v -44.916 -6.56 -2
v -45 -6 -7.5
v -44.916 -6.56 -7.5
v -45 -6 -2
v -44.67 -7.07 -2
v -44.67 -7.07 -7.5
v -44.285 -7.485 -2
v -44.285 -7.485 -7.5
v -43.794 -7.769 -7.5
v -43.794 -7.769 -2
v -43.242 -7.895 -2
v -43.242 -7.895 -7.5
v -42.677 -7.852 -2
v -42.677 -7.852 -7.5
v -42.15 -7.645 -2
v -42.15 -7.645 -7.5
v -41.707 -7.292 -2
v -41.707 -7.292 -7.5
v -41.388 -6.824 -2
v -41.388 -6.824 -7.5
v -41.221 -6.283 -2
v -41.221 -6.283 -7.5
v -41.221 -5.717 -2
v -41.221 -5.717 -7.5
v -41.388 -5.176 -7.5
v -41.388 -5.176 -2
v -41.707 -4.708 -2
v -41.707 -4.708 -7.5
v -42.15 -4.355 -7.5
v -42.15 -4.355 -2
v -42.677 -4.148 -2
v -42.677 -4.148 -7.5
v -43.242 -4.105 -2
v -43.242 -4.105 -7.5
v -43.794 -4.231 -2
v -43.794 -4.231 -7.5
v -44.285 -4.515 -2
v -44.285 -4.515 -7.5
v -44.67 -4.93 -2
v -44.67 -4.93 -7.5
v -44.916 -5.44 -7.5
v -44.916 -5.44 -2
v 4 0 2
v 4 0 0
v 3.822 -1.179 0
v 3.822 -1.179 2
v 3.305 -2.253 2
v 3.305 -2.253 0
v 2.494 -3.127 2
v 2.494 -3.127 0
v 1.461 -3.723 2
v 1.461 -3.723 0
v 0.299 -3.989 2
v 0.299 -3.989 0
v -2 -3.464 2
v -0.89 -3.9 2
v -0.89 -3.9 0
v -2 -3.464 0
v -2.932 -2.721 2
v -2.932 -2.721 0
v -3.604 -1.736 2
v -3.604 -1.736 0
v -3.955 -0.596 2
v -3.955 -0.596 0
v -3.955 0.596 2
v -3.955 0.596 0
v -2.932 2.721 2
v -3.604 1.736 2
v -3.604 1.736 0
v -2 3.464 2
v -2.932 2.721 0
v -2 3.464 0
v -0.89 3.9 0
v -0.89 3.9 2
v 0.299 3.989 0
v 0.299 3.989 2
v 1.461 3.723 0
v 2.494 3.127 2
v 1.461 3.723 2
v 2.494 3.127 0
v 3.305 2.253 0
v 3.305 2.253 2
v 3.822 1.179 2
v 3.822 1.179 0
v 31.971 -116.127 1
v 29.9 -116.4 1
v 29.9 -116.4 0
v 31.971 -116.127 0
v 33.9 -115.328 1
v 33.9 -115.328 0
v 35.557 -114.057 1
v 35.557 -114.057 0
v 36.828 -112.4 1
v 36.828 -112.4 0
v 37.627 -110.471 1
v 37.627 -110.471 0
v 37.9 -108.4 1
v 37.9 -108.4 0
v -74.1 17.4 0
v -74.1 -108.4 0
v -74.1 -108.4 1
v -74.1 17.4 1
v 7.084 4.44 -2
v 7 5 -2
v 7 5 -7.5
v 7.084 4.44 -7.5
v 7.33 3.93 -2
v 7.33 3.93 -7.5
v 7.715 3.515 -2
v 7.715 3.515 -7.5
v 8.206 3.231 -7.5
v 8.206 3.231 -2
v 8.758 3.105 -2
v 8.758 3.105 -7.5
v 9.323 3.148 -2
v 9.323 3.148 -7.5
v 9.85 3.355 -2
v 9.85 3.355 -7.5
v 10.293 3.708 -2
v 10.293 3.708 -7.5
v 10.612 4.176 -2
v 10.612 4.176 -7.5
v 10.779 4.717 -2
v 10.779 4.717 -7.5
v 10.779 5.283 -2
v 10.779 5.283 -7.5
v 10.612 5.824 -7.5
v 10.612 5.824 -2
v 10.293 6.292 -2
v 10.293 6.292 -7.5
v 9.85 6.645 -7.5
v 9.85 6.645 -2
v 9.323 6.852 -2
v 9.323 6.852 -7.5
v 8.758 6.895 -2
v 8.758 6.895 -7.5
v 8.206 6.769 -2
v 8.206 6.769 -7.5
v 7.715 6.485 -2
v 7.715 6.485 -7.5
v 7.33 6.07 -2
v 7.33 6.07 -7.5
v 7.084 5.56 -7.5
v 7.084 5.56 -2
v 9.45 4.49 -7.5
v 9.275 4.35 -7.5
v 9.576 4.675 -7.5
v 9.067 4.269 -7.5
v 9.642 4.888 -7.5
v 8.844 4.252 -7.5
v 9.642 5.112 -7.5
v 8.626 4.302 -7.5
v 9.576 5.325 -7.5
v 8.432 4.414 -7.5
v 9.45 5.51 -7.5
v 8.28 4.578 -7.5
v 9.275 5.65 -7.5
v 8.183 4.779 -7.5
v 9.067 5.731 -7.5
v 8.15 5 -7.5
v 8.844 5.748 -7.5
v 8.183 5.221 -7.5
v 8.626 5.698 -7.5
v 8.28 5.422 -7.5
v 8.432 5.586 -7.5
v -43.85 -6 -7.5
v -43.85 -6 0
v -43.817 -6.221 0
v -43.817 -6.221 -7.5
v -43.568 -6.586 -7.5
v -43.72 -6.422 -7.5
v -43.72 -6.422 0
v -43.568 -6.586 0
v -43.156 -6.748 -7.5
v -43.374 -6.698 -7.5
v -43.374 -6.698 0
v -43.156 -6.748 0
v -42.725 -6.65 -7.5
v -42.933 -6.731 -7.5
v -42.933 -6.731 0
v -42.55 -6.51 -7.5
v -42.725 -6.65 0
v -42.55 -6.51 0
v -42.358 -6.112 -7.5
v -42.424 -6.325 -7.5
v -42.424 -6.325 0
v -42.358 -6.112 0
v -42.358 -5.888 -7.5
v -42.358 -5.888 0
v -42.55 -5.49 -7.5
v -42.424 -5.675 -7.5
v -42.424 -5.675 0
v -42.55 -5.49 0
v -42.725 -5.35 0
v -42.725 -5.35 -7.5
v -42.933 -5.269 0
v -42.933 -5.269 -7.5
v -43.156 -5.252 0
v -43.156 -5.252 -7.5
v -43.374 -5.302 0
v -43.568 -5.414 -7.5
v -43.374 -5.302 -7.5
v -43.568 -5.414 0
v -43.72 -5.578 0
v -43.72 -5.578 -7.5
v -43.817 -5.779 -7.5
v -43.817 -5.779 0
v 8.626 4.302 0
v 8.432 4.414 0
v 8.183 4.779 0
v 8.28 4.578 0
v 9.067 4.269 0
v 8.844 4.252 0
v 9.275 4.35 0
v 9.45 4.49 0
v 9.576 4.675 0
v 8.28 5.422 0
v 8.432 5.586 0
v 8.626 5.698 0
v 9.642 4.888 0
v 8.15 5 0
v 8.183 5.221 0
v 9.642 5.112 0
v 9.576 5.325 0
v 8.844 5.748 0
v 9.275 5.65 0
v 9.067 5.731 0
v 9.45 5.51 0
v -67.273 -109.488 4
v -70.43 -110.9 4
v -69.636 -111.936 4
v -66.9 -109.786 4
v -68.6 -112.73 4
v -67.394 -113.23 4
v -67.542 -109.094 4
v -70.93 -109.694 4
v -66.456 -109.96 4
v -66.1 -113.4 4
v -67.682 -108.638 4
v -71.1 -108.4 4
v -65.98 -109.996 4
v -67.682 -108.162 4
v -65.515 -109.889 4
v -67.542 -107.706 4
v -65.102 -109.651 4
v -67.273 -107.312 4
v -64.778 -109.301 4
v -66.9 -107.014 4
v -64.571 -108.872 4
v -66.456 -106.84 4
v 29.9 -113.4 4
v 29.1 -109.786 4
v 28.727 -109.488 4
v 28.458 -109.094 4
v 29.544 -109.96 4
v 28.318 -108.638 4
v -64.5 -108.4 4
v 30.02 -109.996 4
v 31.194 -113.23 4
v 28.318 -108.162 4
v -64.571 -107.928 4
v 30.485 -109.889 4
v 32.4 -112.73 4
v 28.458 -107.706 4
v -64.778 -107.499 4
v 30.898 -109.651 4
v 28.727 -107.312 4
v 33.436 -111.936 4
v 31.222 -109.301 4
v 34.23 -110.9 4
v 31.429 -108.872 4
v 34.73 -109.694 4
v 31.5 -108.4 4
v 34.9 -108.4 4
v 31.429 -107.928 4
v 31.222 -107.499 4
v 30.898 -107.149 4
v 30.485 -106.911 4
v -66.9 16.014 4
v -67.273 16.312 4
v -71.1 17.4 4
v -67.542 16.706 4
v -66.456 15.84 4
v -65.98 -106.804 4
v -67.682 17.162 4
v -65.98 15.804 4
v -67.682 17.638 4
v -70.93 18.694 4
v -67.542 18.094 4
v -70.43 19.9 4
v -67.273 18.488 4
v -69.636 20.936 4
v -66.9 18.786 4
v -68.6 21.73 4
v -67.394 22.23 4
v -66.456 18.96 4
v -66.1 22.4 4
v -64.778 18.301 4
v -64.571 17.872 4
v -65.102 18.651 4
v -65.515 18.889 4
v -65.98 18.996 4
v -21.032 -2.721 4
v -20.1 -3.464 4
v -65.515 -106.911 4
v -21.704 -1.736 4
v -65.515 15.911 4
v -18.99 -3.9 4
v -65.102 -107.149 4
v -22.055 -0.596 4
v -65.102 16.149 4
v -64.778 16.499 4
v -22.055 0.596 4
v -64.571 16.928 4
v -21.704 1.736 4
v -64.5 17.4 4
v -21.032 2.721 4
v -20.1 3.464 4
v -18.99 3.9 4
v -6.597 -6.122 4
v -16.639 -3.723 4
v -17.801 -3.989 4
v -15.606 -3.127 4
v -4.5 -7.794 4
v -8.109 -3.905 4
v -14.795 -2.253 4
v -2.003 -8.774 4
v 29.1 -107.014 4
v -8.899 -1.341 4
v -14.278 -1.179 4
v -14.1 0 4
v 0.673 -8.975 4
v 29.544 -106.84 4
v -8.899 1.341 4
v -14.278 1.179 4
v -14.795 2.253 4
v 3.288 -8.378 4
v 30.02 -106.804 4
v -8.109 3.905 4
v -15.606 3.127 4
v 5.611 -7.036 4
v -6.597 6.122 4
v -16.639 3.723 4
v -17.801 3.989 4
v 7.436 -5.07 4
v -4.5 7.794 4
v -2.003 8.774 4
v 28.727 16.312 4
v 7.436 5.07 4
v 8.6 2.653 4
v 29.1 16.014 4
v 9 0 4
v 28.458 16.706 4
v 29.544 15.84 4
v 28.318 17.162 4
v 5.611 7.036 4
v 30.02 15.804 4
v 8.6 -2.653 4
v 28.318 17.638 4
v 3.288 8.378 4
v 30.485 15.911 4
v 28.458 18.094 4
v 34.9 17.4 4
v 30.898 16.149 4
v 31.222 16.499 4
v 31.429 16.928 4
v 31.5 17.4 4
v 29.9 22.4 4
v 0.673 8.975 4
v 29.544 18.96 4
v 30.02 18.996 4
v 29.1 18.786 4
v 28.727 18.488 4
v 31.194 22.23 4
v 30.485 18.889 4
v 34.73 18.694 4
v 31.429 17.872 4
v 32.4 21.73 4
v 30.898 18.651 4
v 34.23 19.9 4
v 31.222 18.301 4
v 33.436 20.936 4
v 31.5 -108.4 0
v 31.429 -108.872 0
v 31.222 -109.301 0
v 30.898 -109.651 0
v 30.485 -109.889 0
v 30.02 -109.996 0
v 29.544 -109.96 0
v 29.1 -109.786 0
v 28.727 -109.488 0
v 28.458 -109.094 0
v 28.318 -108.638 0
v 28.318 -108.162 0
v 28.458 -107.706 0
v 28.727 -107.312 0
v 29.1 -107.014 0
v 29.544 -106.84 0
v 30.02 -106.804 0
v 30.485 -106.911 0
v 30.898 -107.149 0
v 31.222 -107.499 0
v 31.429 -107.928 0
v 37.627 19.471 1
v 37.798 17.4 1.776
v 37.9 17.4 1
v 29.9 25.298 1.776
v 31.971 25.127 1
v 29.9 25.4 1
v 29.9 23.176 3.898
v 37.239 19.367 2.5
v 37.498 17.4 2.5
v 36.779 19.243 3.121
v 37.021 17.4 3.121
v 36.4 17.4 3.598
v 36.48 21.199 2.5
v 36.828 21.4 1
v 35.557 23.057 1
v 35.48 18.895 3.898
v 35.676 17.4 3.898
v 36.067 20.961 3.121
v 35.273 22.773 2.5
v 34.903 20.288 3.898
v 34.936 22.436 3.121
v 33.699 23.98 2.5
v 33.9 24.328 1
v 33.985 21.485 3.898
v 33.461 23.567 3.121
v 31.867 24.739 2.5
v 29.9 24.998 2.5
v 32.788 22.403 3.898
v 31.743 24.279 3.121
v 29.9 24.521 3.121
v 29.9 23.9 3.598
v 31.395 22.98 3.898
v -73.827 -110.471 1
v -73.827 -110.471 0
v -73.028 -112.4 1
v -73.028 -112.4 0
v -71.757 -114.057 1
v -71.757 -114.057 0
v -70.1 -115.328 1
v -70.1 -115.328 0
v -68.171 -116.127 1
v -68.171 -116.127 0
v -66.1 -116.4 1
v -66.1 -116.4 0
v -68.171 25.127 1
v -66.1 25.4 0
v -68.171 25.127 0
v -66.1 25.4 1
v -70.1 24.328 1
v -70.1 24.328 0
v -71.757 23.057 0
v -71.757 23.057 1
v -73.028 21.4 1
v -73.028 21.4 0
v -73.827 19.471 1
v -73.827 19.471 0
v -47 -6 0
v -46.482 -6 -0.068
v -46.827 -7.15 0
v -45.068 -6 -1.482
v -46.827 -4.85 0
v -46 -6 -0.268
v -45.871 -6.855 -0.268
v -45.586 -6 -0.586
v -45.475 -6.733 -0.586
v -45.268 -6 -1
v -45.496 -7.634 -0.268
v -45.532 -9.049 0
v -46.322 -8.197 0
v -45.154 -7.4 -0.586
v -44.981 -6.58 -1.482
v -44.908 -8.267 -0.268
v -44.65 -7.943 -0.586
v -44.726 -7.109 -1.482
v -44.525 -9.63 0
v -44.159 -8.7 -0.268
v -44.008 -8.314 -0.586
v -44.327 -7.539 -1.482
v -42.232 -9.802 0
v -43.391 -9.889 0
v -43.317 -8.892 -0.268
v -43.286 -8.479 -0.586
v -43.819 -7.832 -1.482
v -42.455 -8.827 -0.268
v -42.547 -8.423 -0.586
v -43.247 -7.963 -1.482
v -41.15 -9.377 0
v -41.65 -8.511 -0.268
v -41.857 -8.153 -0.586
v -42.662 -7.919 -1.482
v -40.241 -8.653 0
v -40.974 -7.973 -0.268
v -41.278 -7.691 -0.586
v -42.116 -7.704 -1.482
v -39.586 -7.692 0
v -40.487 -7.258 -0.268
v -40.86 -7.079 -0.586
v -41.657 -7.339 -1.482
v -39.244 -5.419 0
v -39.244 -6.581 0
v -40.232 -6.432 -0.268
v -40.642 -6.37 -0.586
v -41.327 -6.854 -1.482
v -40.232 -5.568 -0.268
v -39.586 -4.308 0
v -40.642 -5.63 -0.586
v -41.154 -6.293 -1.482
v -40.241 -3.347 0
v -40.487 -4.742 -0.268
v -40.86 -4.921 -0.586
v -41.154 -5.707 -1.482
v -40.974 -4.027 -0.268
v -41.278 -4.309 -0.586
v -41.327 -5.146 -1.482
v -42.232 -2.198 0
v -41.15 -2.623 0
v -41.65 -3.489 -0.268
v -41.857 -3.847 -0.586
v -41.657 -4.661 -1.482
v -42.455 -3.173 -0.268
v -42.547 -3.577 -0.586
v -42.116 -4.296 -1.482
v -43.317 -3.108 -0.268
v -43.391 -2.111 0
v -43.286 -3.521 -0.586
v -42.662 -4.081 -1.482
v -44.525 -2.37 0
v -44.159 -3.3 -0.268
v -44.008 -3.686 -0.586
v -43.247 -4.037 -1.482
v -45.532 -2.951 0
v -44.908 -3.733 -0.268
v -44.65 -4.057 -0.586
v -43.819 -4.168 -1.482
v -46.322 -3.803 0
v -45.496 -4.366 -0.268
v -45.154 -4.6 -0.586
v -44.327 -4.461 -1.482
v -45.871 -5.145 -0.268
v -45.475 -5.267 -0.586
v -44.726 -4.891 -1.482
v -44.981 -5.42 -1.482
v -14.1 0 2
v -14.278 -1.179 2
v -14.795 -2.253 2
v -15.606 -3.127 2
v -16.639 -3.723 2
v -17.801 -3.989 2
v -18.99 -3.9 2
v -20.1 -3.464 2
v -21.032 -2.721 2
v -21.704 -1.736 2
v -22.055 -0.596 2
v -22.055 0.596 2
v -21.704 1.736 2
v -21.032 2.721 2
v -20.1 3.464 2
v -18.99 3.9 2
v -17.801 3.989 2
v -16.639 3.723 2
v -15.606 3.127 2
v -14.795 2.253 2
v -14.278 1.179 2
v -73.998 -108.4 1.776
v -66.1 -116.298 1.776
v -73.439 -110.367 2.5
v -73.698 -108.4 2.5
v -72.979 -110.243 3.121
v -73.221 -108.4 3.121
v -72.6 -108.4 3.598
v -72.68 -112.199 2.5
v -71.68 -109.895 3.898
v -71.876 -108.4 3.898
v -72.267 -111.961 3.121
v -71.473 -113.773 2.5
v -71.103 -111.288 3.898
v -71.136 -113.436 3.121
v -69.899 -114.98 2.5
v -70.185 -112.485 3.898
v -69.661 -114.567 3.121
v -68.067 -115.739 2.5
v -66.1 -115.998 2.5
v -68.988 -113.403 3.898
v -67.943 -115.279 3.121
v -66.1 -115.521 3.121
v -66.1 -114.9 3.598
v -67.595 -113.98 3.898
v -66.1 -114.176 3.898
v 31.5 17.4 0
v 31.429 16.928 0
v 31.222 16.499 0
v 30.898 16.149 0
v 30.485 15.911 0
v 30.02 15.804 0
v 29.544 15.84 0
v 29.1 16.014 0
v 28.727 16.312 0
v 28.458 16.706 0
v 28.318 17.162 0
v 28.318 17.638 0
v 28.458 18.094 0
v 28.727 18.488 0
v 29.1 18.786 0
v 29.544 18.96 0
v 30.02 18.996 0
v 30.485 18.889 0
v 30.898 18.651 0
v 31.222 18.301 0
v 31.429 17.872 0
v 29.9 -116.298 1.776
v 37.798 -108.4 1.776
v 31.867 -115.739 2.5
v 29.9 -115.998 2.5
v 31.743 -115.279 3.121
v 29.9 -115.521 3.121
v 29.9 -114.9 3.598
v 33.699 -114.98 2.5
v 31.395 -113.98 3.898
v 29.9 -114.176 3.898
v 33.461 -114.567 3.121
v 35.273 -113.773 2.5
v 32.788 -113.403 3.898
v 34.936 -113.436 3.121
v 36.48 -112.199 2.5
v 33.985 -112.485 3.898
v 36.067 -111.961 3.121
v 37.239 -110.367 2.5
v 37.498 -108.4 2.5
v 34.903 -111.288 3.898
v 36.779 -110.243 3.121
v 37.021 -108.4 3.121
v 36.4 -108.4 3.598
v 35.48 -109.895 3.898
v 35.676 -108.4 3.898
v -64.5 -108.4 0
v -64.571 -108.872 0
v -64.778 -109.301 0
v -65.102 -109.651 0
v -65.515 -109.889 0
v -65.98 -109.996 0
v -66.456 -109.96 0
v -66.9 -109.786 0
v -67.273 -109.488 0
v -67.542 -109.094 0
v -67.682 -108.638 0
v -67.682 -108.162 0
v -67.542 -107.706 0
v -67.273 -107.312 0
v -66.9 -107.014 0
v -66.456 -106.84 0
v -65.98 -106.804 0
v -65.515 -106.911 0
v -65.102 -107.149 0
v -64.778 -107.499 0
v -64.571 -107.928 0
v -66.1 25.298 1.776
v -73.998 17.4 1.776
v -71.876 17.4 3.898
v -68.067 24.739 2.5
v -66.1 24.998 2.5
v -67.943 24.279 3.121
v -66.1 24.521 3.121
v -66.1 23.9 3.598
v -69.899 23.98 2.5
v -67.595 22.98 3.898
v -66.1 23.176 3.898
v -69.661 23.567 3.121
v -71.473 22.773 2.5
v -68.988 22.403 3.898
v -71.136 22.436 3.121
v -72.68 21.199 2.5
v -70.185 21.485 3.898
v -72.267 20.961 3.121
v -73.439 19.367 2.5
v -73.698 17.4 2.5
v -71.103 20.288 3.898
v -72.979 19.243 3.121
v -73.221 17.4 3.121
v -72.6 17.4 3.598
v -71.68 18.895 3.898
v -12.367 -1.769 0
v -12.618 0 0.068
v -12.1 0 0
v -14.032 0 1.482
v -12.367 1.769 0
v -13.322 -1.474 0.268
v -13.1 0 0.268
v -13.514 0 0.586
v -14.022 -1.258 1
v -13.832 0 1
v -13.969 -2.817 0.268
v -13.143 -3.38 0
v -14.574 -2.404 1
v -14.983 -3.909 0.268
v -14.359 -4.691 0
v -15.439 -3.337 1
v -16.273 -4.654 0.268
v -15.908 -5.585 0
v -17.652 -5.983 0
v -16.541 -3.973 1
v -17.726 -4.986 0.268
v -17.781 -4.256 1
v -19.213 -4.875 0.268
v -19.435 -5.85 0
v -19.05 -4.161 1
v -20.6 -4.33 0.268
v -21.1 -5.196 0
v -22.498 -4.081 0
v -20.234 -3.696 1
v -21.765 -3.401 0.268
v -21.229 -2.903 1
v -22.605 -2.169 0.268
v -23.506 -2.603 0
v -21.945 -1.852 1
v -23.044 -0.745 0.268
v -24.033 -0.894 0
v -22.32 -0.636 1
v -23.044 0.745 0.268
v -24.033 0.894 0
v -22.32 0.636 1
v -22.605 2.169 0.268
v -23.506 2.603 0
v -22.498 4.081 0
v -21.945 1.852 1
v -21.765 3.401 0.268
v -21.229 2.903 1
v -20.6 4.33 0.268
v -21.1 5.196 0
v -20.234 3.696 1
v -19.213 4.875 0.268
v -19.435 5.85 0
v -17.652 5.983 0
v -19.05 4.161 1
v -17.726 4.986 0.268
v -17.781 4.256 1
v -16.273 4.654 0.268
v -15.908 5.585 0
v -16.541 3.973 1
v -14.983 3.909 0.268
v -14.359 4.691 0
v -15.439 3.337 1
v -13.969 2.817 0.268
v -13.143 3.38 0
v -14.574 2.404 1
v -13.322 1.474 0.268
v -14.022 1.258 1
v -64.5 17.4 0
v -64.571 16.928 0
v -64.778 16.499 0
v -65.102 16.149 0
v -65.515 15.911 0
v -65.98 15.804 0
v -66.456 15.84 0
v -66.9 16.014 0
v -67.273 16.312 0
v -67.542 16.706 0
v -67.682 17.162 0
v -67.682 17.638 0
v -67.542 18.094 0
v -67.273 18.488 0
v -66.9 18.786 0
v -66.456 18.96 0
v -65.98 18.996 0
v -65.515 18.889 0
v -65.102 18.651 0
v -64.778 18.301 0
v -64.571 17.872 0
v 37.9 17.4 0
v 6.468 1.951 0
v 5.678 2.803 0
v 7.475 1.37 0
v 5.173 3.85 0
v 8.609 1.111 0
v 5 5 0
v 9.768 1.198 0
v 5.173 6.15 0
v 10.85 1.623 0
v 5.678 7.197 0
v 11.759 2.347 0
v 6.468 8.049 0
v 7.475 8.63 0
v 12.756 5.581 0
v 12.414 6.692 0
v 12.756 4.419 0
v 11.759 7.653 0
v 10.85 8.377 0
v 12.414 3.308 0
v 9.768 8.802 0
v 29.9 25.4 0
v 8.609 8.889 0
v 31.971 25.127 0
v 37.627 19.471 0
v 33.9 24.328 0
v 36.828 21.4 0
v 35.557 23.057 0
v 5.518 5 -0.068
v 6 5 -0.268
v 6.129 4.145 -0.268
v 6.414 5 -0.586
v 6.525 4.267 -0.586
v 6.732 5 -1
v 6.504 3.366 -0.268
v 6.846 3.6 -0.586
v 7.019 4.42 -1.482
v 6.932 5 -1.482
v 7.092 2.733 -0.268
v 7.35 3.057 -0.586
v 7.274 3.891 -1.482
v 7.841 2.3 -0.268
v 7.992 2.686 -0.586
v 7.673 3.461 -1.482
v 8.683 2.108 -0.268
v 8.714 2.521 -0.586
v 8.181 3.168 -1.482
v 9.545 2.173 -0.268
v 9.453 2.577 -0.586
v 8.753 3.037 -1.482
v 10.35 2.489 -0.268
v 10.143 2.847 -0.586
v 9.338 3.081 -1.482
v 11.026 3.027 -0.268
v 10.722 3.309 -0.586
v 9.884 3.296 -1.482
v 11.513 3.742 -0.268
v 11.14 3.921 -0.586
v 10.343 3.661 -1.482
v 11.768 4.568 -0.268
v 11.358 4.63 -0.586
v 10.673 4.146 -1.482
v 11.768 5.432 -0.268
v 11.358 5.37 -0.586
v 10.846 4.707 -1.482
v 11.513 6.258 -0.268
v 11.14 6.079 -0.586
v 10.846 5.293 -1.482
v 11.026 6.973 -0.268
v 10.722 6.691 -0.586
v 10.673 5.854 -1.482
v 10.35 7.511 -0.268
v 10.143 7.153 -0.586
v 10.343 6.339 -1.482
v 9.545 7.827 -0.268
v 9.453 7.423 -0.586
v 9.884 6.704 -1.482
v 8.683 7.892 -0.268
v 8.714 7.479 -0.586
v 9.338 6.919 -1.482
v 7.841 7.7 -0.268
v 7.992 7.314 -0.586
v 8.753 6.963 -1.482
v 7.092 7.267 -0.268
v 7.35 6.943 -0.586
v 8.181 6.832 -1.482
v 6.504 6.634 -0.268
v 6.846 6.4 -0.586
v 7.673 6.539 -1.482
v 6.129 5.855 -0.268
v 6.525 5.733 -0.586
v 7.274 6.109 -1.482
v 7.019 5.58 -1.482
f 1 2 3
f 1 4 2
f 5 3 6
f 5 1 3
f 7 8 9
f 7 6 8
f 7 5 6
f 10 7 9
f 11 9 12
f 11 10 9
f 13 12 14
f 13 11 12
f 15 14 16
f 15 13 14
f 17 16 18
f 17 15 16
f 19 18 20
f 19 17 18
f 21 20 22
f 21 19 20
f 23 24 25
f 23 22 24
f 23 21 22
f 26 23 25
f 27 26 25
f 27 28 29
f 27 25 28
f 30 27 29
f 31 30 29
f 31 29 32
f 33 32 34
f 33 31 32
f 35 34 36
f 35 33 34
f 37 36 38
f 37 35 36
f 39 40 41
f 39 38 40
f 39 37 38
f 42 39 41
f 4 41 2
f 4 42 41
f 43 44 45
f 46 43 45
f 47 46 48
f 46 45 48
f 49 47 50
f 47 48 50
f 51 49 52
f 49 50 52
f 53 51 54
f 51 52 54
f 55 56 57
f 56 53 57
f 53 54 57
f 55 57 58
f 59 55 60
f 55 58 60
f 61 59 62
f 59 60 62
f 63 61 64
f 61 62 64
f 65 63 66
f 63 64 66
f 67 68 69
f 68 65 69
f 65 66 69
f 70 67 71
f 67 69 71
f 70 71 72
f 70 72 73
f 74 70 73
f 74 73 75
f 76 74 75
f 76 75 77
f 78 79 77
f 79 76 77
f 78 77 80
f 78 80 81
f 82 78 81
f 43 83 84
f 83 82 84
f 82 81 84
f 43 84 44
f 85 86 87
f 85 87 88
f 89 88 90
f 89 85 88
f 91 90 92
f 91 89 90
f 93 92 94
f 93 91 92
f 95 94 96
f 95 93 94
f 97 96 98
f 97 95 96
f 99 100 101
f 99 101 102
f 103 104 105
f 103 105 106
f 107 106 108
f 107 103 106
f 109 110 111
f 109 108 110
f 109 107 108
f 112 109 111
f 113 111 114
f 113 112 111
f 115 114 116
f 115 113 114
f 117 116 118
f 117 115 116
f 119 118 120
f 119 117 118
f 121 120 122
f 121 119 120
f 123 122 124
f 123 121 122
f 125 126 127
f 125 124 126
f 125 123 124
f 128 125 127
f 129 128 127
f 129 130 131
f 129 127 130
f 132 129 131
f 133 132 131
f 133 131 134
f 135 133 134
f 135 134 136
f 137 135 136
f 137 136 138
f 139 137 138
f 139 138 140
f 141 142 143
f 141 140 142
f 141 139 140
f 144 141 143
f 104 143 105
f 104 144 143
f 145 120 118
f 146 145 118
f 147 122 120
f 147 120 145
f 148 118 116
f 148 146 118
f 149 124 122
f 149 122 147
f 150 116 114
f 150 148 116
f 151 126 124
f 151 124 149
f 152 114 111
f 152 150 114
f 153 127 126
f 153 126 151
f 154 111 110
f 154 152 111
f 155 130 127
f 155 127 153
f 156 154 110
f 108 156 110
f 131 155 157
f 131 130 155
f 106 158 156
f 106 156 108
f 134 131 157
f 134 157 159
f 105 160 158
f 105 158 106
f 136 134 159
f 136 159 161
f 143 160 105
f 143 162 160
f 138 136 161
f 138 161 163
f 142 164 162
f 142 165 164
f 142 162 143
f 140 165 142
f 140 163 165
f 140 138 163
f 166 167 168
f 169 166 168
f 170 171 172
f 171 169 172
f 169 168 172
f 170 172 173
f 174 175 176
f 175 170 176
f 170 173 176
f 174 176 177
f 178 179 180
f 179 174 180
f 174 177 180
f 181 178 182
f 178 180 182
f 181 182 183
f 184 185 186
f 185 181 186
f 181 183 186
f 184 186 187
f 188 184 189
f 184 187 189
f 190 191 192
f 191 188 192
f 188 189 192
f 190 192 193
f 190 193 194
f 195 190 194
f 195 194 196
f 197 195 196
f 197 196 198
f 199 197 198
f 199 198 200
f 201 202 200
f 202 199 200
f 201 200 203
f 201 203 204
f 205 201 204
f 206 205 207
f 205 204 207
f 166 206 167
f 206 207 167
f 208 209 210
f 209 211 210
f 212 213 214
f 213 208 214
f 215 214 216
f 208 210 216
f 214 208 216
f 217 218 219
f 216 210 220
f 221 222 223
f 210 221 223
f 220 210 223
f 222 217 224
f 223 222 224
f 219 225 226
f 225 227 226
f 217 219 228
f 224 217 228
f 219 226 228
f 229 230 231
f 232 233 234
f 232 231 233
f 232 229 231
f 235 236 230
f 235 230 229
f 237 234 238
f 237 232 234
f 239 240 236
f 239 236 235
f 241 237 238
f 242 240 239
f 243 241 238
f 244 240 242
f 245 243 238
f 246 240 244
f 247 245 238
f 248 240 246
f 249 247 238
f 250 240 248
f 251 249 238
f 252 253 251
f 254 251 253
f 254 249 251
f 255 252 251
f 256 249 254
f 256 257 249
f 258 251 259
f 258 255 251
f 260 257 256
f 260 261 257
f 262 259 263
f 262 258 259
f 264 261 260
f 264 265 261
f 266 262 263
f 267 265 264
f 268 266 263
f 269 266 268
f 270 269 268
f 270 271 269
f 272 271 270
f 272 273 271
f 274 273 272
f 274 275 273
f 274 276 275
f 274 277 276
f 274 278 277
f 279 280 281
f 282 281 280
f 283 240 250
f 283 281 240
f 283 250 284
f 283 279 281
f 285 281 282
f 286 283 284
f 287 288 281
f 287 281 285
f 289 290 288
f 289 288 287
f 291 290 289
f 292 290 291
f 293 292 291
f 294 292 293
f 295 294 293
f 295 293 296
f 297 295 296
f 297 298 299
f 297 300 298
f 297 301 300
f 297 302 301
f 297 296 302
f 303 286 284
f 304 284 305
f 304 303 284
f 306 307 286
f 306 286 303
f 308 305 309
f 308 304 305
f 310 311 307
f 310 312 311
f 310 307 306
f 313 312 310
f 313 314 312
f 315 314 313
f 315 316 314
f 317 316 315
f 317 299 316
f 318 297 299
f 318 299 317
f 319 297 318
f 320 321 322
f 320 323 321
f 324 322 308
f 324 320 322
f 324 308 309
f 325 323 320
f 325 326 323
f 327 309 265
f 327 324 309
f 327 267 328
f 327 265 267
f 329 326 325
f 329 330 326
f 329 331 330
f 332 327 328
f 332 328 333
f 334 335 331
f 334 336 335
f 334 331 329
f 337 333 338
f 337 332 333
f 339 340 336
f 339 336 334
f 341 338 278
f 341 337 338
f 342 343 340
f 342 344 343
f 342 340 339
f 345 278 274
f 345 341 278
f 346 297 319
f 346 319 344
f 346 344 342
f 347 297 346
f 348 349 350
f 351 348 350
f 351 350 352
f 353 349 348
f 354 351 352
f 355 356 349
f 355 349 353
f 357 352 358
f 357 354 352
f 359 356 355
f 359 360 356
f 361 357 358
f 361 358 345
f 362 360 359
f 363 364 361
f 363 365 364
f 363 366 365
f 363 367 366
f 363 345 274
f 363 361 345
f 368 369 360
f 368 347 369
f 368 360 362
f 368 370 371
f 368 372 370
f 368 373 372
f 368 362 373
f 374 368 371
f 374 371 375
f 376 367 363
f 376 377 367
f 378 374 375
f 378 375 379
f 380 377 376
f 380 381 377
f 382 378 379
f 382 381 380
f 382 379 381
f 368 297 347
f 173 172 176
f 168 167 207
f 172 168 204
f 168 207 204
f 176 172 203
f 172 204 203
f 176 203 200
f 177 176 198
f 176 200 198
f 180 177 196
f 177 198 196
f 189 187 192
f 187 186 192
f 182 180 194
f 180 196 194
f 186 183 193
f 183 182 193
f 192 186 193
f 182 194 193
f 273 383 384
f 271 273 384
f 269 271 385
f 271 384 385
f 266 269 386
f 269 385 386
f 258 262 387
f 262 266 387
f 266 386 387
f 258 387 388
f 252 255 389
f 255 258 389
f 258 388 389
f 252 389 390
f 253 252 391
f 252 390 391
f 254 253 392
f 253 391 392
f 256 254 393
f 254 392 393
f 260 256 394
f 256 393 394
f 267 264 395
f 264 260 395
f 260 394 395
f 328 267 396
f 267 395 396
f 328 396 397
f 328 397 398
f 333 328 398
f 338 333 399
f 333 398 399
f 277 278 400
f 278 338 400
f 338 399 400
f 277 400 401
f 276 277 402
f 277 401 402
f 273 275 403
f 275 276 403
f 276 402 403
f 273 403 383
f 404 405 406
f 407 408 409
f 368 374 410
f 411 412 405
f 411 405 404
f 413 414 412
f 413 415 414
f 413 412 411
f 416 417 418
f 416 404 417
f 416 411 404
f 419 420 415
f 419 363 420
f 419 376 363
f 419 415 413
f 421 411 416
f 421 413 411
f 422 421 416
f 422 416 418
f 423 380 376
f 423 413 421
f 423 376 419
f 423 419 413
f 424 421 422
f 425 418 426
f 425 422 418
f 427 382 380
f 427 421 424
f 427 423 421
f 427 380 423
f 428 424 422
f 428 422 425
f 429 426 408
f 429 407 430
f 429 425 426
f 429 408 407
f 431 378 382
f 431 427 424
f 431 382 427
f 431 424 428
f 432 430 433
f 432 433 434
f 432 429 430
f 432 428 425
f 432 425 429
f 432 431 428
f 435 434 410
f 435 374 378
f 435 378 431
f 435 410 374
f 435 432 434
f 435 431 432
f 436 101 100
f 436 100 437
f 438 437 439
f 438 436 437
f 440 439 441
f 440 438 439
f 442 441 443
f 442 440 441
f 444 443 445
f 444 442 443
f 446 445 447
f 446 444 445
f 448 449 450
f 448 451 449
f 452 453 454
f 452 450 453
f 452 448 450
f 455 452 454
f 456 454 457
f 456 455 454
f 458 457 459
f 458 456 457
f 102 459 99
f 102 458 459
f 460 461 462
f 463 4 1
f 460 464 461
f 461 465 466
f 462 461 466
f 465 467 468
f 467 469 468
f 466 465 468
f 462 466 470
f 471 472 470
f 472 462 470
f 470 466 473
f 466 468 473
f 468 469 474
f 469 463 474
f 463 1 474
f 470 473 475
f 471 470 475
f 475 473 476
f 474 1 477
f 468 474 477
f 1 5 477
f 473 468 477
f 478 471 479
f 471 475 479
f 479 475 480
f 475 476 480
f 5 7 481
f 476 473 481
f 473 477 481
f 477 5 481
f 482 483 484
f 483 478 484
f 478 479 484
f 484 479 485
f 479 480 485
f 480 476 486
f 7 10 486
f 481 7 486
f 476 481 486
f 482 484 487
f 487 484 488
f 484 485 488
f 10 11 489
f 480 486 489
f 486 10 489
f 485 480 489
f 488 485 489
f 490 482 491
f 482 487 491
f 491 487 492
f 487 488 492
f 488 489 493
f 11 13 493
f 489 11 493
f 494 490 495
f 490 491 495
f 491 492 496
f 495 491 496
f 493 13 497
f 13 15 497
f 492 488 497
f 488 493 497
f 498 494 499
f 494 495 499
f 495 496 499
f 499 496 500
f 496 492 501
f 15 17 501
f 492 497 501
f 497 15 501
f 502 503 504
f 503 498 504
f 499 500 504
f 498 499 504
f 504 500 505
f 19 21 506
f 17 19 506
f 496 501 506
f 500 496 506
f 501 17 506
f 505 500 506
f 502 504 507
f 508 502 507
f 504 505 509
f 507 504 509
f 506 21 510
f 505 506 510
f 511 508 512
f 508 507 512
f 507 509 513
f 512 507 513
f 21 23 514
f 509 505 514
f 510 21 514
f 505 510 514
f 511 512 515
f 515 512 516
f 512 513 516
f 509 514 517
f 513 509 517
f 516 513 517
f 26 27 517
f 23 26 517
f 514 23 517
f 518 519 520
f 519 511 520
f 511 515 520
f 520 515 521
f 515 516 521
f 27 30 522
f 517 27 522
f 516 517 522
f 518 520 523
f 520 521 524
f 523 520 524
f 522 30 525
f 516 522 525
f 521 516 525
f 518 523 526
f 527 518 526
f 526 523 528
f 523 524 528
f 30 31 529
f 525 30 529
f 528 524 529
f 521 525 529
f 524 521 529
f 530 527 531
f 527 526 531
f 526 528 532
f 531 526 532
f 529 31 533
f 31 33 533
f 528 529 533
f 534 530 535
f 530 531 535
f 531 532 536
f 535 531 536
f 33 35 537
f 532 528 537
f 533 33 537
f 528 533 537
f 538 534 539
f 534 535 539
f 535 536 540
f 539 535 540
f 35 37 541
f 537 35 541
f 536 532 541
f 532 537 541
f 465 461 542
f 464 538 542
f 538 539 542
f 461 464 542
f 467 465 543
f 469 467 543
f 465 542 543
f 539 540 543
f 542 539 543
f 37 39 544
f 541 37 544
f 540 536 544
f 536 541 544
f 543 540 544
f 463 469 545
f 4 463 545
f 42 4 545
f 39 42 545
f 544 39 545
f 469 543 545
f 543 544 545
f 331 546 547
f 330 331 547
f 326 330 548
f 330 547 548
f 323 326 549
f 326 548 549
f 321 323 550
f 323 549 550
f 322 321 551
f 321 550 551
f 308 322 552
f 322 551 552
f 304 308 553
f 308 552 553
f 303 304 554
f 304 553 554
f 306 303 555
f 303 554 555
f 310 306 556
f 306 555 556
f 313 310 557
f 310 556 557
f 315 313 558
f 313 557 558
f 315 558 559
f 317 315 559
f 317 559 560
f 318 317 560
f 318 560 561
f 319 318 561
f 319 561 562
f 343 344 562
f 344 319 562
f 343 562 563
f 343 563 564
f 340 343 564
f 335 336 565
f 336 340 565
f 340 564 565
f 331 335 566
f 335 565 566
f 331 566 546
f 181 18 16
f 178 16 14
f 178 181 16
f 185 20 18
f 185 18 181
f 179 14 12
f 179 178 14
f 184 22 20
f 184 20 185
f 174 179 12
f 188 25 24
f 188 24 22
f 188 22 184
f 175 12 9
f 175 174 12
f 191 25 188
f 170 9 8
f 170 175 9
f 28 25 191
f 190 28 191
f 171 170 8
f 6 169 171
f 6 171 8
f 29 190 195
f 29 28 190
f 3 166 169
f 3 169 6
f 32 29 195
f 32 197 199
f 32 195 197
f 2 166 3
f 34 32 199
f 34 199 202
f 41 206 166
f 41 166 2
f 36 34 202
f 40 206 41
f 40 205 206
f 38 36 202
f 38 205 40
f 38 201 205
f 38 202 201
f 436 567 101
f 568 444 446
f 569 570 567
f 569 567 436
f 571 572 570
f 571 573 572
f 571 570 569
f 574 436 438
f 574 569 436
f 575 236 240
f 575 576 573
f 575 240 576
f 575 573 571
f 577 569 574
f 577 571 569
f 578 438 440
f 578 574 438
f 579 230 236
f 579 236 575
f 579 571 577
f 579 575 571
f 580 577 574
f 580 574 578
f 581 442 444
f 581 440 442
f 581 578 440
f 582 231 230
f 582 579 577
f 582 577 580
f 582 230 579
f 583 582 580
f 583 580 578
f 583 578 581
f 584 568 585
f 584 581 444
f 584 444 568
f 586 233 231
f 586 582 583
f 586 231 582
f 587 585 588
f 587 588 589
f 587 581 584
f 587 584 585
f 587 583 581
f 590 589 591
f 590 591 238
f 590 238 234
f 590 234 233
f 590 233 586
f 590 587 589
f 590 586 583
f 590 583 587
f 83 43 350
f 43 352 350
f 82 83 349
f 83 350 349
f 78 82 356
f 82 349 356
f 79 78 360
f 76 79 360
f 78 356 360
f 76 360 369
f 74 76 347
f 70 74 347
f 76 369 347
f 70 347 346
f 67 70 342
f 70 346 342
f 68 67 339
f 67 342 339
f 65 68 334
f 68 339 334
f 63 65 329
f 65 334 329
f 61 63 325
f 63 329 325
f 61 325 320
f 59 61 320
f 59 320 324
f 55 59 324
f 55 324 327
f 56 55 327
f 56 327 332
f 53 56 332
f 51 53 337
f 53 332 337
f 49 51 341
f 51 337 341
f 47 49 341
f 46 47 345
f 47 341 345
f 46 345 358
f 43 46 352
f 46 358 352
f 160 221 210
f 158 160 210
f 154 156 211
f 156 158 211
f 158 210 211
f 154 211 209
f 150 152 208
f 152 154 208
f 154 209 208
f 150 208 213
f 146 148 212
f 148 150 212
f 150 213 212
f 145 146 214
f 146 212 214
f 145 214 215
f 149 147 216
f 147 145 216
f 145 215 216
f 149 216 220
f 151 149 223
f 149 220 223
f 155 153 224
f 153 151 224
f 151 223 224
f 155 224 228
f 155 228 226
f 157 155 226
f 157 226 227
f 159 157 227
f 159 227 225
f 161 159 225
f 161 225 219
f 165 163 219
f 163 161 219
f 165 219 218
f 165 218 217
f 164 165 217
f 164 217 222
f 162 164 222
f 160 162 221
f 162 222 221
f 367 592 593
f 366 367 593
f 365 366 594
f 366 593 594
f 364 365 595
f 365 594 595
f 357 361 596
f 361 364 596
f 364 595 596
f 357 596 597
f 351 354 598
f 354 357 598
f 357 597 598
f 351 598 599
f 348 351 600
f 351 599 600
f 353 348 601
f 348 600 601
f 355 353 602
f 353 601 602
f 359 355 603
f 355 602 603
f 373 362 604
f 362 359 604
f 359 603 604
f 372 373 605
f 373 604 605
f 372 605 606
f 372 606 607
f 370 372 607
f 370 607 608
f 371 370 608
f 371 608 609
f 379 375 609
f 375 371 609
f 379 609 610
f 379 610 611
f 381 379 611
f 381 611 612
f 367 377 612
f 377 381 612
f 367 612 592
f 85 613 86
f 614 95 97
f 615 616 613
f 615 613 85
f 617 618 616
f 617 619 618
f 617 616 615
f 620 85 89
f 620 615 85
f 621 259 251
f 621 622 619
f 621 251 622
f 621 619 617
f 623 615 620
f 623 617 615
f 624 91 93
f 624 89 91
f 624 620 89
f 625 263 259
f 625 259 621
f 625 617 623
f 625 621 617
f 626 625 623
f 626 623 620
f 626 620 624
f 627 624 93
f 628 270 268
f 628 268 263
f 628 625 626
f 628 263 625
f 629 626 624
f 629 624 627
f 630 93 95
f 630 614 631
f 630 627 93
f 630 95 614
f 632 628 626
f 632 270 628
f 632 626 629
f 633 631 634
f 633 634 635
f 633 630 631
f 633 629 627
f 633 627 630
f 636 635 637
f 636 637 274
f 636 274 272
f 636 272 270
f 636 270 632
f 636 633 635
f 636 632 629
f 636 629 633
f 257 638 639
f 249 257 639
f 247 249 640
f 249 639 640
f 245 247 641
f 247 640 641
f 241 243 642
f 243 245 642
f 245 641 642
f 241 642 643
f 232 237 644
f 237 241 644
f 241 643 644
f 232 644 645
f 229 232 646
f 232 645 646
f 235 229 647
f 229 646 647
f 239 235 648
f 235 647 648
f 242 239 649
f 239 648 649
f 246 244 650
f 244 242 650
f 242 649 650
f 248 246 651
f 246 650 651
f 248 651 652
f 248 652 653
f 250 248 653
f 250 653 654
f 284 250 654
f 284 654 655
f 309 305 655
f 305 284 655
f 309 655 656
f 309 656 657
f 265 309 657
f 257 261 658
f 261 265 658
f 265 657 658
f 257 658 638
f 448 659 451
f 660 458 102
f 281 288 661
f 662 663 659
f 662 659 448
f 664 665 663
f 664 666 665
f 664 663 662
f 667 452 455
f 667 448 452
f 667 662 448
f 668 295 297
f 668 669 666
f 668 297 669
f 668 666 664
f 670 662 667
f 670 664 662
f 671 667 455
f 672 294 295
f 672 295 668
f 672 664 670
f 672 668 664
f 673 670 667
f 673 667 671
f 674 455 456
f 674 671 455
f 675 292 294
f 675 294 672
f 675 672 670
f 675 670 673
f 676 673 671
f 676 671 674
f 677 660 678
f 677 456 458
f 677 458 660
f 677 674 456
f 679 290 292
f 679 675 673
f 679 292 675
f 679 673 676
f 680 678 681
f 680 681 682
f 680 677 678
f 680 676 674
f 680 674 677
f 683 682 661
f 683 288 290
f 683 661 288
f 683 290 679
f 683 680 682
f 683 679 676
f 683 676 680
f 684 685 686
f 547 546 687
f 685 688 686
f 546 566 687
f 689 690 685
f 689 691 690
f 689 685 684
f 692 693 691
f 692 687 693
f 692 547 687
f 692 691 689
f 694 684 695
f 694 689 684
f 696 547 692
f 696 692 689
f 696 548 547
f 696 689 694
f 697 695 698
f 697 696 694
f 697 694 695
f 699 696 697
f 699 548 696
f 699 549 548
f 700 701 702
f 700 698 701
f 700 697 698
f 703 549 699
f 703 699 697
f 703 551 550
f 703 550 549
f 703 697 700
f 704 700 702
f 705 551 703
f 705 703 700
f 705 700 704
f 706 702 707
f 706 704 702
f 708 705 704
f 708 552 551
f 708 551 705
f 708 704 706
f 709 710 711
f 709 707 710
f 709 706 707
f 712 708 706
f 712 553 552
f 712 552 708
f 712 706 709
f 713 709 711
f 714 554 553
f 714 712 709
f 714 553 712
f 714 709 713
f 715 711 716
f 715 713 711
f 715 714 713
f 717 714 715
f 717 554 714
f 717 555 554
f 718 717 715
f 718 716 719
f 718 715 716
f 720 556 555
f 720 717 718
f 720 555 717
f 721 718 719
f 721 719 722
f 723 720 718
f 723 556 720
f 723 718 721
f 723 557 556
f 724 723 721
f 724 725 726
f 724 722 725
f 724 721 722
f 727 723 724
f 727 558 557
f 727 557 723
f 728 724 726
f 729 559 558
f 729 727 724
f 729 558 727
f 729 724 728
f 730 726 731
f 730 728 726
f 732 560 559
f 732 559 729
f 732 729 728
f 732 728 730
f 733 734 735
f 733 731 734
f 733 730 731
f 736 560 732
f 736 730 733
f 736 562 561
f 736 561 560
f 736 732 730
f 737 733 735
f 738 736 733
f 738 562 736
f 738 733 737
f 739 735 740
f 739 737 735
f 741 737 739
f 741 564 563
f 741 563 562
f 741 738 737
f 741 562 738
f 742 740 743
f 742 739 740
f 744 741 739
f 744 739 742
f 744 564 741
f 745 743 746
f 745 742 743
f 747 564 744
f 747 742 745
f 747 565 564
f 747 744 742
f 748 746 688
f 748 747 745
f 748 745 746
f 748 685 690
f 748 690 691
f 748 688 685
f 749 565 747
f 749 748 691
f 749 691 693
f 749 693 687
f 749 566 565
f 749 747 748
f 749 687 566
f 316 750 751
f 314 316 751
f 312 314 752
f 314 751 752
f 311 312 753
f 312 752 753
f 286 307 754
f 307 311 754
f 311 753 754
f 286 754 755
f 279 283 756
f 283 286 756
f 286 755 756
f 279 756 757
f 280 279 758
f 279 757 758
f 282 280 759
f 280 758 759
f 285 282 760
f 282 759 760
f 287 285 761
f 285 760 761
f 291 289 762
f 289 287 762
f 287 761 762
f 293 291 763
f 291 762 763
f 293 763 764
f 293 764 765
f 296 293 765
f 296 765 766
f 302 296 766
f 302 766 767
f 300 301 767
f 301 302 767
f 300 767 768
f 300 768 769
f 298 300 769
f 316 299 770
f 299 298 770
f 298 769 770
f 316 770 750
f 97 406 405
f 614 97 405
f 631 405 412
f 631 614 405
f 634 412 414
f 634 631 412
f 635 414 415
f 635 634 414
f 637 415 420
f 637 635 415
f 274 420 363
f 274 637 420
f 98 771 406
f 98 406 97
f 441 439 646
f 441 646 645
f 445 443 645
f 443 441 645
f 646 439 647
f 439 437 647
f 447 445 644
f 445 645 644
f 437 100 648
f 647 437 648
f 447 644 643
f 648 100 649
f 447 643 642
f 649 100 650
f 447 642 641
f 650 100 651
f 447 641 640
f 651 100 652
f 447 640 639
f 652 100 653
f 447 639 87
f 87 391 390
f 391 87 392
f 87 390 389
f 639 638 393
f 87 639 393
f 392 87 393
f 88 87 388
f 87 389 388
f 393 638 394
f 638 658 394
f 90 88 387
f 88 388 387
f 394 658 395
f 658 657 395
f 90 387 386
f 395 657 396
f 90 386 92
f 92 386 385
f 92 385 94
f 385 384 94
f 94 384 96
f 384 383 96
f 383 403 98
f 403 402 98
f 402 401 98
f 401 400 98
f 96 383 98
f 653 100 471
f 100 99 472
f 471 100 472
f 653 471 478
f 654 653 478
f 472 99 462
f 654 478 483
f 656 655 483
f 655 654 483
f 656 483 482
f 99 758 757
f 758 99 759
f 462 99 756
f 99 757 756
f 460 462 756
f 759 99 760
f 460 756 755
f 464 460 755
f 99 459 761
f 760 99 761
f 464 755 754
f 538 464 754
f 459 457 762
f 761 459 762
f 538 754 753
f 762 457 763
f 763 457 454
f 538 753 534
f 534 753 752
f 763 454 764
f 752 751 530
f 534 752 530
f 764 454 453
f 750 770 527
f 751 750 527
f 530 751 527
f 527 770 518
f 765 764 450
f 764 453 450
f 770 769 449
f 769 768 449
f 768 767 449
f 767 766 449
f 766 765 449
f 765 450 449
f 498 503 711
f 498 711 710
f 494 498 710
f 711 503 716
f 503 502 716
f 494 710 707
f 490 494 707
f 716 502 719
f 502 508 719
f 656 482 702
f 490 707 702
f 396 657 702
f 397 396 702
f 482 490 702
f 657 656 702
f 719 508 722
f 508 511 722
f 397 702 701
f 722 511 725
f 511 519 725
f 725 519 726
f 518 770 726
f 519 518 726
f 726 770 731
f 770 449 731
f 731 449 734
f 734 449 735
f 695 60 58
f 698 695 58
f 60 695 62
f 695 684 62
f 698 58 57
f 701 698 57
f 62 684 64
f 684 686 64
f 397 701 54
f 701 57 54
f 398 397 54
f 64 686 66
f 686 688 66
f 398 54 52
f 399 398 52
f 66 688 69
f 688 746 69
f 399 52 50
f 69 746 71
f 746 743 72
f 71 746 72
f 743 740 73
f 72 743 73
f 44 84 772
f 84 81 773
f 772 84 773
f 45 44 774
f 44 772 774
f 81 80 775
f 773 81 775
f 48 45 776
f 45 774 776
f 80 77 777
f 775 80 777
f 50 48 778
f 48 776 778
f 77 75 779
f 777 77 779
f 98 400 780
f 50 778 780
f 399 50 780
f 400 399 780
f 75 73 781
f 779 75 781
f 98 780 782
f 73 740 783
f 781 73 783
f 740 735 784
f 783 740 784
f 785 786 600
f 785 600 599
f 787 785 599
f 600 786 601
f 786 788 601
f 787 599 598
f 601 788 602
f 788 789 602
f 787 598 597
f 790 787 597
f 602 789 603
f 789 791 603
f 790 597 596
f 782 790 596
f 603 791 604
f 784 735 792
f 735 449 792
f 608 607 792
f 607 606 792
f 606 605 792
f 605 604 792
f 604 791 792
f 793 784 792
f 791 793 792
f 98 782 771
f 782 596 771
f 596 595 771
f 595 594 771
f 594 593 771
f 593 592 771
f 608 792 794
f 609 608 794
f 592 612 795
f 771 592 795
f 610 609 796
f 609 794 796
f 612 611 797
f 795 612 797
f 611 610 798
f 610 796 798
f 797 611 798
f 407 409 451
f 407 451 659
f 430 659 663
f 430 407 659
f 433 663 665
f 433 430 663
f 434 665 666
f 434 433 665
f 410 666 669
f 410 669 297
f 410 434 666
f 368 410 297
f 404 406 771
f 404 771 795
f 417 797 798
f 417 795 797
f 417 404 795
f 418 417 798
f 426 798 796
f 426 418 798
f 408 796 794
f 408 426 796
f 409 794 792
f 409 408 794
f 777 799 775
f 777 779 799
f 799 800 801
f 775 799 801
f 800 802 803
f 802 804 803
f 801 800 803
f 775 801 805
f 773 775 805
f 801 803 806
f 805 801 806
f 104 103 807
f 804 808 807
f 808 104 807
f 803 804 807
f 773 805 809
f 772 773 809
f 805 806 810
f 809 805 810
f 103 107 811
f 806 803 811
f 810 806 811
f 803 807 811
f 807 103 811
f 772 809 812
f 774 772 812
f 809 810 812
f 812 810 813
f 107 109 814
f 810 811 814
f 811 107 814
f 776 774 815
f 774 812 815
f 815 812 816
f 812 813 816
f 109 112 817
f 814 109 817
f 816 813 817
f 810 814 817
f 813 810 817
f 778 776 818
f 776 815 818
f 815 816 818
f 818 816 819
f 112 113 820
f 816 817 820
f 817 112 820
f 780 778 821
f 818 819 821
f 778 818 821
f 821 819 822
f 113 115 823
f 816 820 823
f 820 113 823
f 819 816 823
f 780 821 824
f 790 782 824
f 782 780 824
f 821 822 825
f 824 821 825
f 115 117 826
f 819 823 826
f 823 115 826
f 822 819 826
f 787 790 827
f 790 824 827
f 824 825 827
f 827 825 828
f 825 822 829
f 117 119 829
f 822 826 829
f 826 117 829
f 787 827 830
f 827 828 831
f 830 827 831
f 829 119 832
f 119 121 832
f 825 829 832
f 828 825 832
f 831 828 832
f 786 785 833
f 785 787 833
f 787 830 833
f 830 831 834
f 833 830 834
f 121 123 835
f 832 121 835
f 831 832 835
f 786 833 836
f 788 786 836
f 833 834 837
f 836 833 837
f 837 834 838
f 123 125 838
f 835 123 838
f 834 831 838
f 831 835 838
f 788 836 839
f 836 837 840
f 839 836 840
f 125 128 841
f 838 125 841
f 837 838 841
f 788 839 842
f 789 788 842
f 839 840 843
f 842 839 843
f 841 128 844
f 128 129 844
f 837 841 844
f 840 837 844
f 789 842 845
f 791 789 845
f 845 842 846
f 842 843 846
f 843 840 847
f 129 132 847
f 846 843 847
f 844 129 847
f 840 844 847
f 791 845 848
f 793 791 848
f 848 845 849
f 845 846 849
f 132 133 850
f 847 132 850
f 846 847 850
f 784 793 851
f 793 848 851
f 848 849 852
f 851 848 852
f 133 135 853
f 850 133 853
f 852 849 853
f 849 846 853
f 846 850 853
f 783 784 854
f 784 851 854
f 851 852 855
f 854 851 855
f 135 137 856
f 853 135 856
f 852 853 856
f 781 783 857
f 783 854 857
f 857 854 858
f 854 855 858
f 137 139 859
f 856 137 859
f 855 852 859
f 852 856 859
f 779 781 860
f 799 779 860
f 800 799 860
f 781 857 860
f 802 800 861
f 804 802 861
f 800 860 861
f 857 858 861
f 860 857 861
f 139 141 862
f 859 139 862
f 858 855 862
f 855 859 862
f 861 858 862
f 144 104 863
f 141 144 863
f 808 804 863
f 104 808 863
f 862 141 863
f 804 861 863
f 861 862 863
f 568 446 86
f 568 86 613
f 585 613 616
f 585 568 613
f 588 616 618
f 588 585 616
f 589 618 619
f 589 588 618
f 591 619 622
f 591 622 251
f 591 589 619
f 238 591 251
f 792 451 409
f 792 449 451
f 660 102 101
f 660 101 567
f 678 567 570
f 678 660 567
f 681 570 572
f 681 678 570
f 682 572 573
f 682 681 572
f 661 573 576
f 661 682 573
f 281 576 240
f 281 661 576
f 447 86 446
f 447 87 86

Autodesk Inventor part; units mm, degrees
ref_plane "YZ Plane" through (0, 0, 0) normal (1, 0, 0) x (0, 1, 0)
sketch "Sketch1" plane through (0, 0, 0) normal (0, 0, 1) x (1, 0, 0)
  circle A0 centre (0, 0) radius 4 projected
  circle A1 centre (-18.1, 0) radius 2.9 construction
  circle A2 centre (29.9, -108.4) radius 1.6
  circle A3 centre (-66.1, -108.4) radius 1.6
  circle A4 centre (-66.1, 17.4) radius 1.6
  circle A5 centre (29.9, 17.4) radius 1.6
  line L0 (29.9, 17.4) -> (-66.1, 17.4) construction
  line L1 (37.9, -116.4) -> (-74.1, -116.4)
  line L2 (-74.1, -116.4) -> (-74.1, 25.4)
  line L3 (-74.1, 25.4) -> (37.9, 25.4)
  line L4 (37.9, 25.4) -> (37.9, -116.4)
  line L5 (-66.1, -108.4) -> (-66.1, 17.4) construction
  circle A6 centre (-18.1, 0) radius 4
  point P0 (-18.1, 17.4)
  point P1 (-18.1, 25.4)
  point P2 (-66.1, -45.5)
  point P3 (-74.1, -45.5)
  dimension "d0" = 3.2
  dimension "d1" = 96
  dimension "d2" = 125.8
  dimension "d3" = 141.8
  dimension "d4" = 112
  dimension "d5" = 25.4
  dimension "d11" = 8
ref_plane "Work Plane1" through (-18.1, 0, 3.4982) normal (0, 0, 1) x (1, 0, 0)
extrude "Extrusion1" add sketch "Sketch1" along normal blind 4
chamfer "Chamfer1" distance 5 distance2 2 1 edges at (-4, 0, 4) measured on face at (-17.9393, -72.8829, 4)
fillet "Fillet1" radius 8 4 edges at (37.9, 25.4, 2) (-74.1, 25.4, 2) (-74.1, -116.4, 2) (37.9, -116.4, 2)
sketch "Sketch2" plane through (0, 0, 4) normal (0, 0, 1) x (1, 0, 0)
  line L0 (32.7, -97.35) -> (-68.9, -97.35) construction
  line L1 (-68.9, -97.35) -> (-68.9, 4.25) construction
  line L2 (-68.9, 4.25) -> (32.7, 4.25) construction
  line L3 (32.7, 4.25) -> (32.7, -97.35) construction
  line L4 (-66.1, -116.4) -> (29.9, -116.4) construction
  point P0 (0, 0)
  point P1 (-18.1, -116.4)
  point P2 (-18.1, -97.35)
  dimension "d25" = 101.6
  dimension "d31" = 19.05
fillet "Fillet2" radius 2 1 edges at (-22.1, 0, 0)
sketch "Sketch3" plane through (0, 0, 0) normal (0, 0, -1) x (-1, 0, 0)
  circle A0 centre (43.1, -6) radius 1 construction
  circle A1 centre (-8.9, 5) radius 1 construction
  circle A2 centre (43.1, -6) radius 0.75
  circle A3 centre (-8.9, 5) radius 0.75
  circle A4 centre (43.1, -6) radius 1.9
  circle A5 centre (-8.9, 5) radius 1.9
  point P0 (0, 0)
  dimension "d33" = 1.5
  dimension "d34" = 3.8
ref_plane "Work Plane2" through (0, -10.5, -7.5) normal (0, 0, 1) x (1, 0, 0)
extrude "Extrusion2" add sketch "Sketch3" along normal up to surface (7.5 mm away)
fillet "Fillet3" radius 2 2 edges at (-41.2, -6, 0) (10.8, 5, 0)
fillet "Fillet4" radius 3 8 edges at (35.5569, 23.0569, 4) (-18.1, 25.4, 4) (-71.7569, 23.0569, 4) (-74.1, -45.5, 4) (-71.7569, -114.0569, 4) (-18.1, -116.4, 4) (35.5569, -114.0569, 4) (37.9, -45.5, 4)
properties part number "Lid"
